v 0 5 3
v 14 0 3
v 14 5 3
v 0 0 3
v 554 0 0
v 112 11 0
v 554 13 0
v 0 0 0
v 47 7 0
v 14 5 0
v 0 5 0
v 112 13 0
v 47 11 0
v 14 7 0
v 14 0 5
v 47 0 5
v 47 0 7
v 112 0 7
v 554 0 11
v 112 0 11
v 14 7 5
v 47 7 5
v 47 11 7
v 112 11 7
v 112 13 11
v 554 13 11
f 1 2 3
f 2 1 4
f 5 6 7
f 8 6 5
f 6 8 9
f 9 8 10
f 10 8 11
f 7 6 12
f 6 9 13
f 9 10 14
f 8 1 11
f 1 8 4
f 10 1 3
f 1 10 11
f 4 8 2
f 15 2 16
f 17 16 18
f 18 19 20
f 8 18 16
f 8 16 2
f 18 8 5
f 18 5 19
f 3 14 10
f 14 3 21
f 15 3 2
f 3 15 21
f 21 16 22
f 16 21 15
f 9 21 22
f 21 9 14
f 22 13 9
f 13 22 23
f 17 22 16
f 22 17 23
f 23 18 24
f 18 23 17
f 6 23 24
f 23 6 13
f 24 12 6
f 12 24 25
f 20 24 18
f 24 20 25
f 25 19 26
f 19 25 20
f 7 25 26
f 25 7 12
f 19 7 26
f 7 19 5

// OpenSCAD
translate([1.0, 2.5, 1.5]) color([0.2564796746315954, 0.6409972685732053, 0.9970404948887329]) cube([2, 5, 3], center=true);
translate([3.0, 2.5, 1.5]) color([0.797433214008021, 0.6234150837835258, 0.10462968943990791]) cube([2, 5, 3], center=true);
translate([5.0, 2.5, 1.5]) color([0.4584080456050631, 0.3616420965372864, 0.8269865896652219]) cube([2, 5, 3], center=true);
translate([7.0, 2.5, 1.5]) color([0.10474628201641056, 0.596240475647071, 0.48790140560568873]) cube([2, 5, 3], center=true);
translate([9.0, 2.5, 1.5]) color([0.5639041170917963, 0.6383635452384463, 0.42323888002080157]) cube([2, 5, 3], center=true);
translate([11.0, 2.5, 1.5]) color([0.5212286449626529, 0.6793183678168555, 0.8877818831984722]) cube([2, 5, 3], center=true);
translate([13.0, 2.5, 1.5]) color([0.8335334993782705, 0.998183045526196, 0.635064793155105]) cube([2, 5, 3], center=true);
translate([15.5, 3.5, 2.5]) color([0.8746990054994174, 0.5428090736997917, 0.9313134045807503]) cube([3, 7, 5], center=true);
translate([18.5, 3.5, 2.5]) color([0.009704659433814156, 0.7055937347007278, 0.7470388851985934]) cube([3, 7, 5], center=true);
translate([21.5, 3.5, 2.5]) color([0.3182594390073298, 0.32182488616904803, 0.5251073848334467]) cube([3, 7, 5], center=true);
translate([24.5, 3.5, 2.5]) color([0.8744832594460391, 0.6025867148054135, 0.15590536476920036]) cube([3, 7, 5], center=true);
translate([27.5, 3.5, 2.5]) color([0.37900510864666237, 0.2943823465565715, 0.7063732058335496]) cube([3, 7, 5], center=true);
translate([30.5, 3.5, 2.5]) color([0.47043138046830235, 0.799945824478888, 0.5165278007752844]) cube([3, 7, 5], center=true);
translate([33.5, 3.5, 2.5]) color([0.9155142682747232, 0.06635468620874474, 0.13049414784187097]) cube([3, 7, 5], center=true);
translate([36.5, 3.5, 2.5]) color([0.3004482911175872, 0.7588987264331779, 0.4485890964462933]) cube([3, 7, 5], center=true);
translate([39.5, 3.5, 2.5]) color([0.8619033855251227, 0.8006454493762514, 0.8686955098516022]) cube([3, 7, 5], center=true);
translate([42.5, 3.5, 2.5]) color([0.4607350972935428, 0.37132186818867685, 0.38223256097056324]) cube([3, 7, 5], center=true);
translate([45.5, 3.5, 2.5]) color([0.5298076607467874, 0.033618014856222844, 0.09064689039119589]) cube([3, 7, 5], center=true);
translate([49.5, 5.5, 3.5]) color([0.7941451579713075, 0.5179983582932232, 0.6001422851572377]) cube([5, 11, 7], center=true);
translate([54.5, 5.5, 3.5]) color([0.07635810782734587, 0.42636667866841493, 0.7546182662703457]) cube([5, 11, 7], center=true);
translate([59.5, 5.5, 3.5]) color([0.2896641383723638, 0.9011387199060191, 0.4178406508691356]) cube([5, 11, 7], center=true);
translate([64.5, 5.5, 3.5]) color([0.9725485107467589, 0.8454919814395919, 0.9722338049752182]) cube([5, 11, 7], center=true);
translate([69.5, 5.5, 3.5]) color([0.6074299110948179, 0.23357109614697547, 0.8647767439340015]) cube([5, 11, 7], center=true);
translate([74.5, 5.5, 3.5]) color([0.020481785066310598, 0.8852550461906246, 0.7407454042283365]) cube([5, 11, 7], center=true);
translate([79.5, 5.5, 3.5]) color([0.30244204779608386, 0.5702666361217156, 0.3326858137966755]) cube([5, 11, 7], center=true);
translate([84.5, 5.5, 3.5]) color([0.49351002171548763, 0.2620075340788589, 0.8250203378707534]) cube([5, 11, 7], center=true);
translate([89.5, 5.5, 3.5]) color([0.7724801555877414, 0.3841597274693662, 0.3836794276703801]) cube([5, 11, 7], center=true);
translate([94.5, 5.5, 3.5]) color([0.16379542381305134, 0.9355243379423083, 0.23895170008456956]) cube([5, 11, 7], center=true);
translate([99.5, 5.5, 3.5]) color([0.7294506641472926, 0.334024645801835, 0.9418620991403894]) cube([5, 11, 7], center=true);
translate([104.5, 5.5, 3.5]) color([0.4813304127593788, 0.14090487727396894, 0.8899614875266342]) cube([5, 11, 7], center=true);
translate([109.5, 5.5, 3.5]) color([0.6019667067914363, 0.08161964024263468, 0.6986964058233333]) cube([5, 11, 7], center=true);
translate([115.5, 6.5, 5.5]) color([0.8102884962164306, 0.3527718366022422, 0.03517979094215373]) cube([7, 13, 11], center=true);
translate([122.5, 6.5, 5.5]) color([0.4662789582213983, 0.458882332198567, 0.10148050986892876]) cube([7, 13, 11], center=true);
translate([129.5, 6.5, 5.5]) color([0.7781483542276006, 0.02022807324279441, 0.5983002604350479]) cube([7, 13, 11], center=true);
translate([136.5, 6.5, 5.5]) color([0.13270195297871745, 0.3239113547302247, 0.7000796910311562]) cube([7, 13, 11], center=true);
translate([143.5, 6.5, 5.5]) color([0.6489922579129634, 0.19497362064878687, 0.7834169698984913]) cube([7, 13, 11], center=true);
translate([150.5, 6.5, 5.5]) color([0.7774609885388588, 0.11099692345616674, 0.060160827712116616]) cube([7, 13, 11], center=true);
translate([157.5, 6.5, 5.5]) color([0.7008174245595068, 0.6143308403515266, 0.9339155207415325]) cube([7, 13, 11], center=true);
translate([164.5, 6.5, 5.5]) color([0.6504721799814983, 0.9694854220936419, 0.7136168898793864]) cube([7, 13, 11], center=true);
translate([171.5, 6.5, 5.5]) color([0.2963863893491513, 0.8491315553121948, 0.95846907728749]) cube([7, 13, 11], center=true);
translate([178.5, 6.5, 5.5]) color([0.38764569013819994, 0.29380353478258403, 0.7457841029207014]) cube([7, 13, 11], center=true);
translate([185.5, 6.5, 5.5]) color([0.9575468650535228, 0.98339807845839, 0.12155240415787172]) cube([7, 13, 11], center=true);
translate([192.5, 6.5, 5.5]) color([0.8604321836344089, 0.9958411320233901, 0.03818441020037311]) cube([7, 13, 11], center=true);
translate([199.5, 6.5, 5.5]) color([0.39202639046743215, 0.3715816420064585, 0.19047756087385292]) cube([7, 13, 11], center=true);
translate([206.5, 6.5, 5.5]) color([0.3565538137373233, 0.6320134108911423, 0.9564975354421206]) cube([7, 13, 11], center=true);
translate([213.5, 6.5, 5.5]) color([0.901927522825372, 0.039980675922074105, 0.2553863294502452]) cube([7, 13, 11], center=true);
translate([220.5, 6.5, 5.5]) color([0.02665600139486224, 0.5200631817170318, 0.5692567569896342]) cube([7, 13, 11], center=true);
translate([227.5, 6.5, 5.5]) color([0.8758772851227178, 0.2296552367022351, 0.7763426439418957]) cube([7, 13, 11], center=true);
translate([239.5, 6.5, 5.5]) color([0.8846860519705121, 0.6274277551427163, 0.5024128608294012]) cube([17, 13, 11], center=true);
translate([256.5, 6.5, 5.5]) color([0.5237115354844265, 0.5071067236759631, 0.9454855480301745]) cube([17, 13, 11], center=true);
translate([273.5, 6.5, 5.5]) color([0.14569042195357562, 0.8918421087116969, 0.42205651792049836]) cube([17, 13, 11], center=true);
translate([290.5, 6.5, 5.5]) color([0.08403205823715598, 0.1047646210762947, 0.06292282863863541]) cube([17, 13, 11], center=true);
translate([307.5, 6.5, 5.5]) color([0.4151614515022839, 0.15615697007089357, 0.9545538427732947]) cube([17, 13, 11], center=true);
translate([324.5, 6.5, 5.5]) color([0.7913428503775491, 0.43108631436838285, 0.41701950900356644]) cube([17, 13, 11], center=true);
translate([341.5, 6.5, 5.5]) color([0.4966247746294912, 0.86405767472269, 0.32449912818180593]) cube([17, 13, 11], center=true);
translate([358.5, 6.5, 5.5]) color([0.25258592574699623, 0.35250302456564797, 0.12137799977699892]) cube([17, 13, 11], center=true);
translate([375.5, 6.5, 5.5]) color([0.691775150815975, 0.34544510653523897, 0.17790766067776254]) cube([17, 13, 11], center=true);
translate([392.5, 6.5, 5.5]) color([0.830270051764872, 0.23049353673314077, 0.3658024748453319]) cube([17, 13, 11], center=true);
translate([409.5, 6.5, 5.5]) color([0.5965890354919068, 0.14329113966210216, 0.003232100641658797]) cube([17, 13, 11], center=true);
translate([426.5, 6.5, 5.5]) color([0.6590184917581017, 0.7321014772226084, 0.9009039411186286]) cube([17, 13, 11], center=true);
translate([443.5, 6.5, 5.5]) color([0.7479768172441763, 0.29326295382626455, 0.6894664766240866]) cube([17, 13, 11], center=true);
translate([460.5, 6.5, 5.5]) color([0.932788033819558, 0.23286310478430694, 0.14188743522012004]) cube([17, 13, 11], center=true);
translate([477.5, 6.5, 5.5]) color([0.4540480681686925, 0.4766939084563374, 0.7074804824528956]) cube([17, 13, 11], center=true);
translate([494.5, 6.5, 5.5]) color([0.2582188407343454, 0.027936242271358158, 0.20812012525081536]) cube([17, 13, 11], center=true);
translate([511.5, 6.5, 5.5]) color([0.33501316214628807, 0.9609071038114427, 0.29634664160852753]) cube([17, 13, 11], center=true);
translate([528.5, 6.5, 5.5]) color([0.8784103092413238, 0.5532045188241876, 0.32698413866792275]) cube([17, 13, 11], center=true);
translate([545.5, 6.5, 5.5]) color([0.5930193960141523, 0.08080901281968078, 0.5332278801564081]) cube([17, 13, 11], center=true);
